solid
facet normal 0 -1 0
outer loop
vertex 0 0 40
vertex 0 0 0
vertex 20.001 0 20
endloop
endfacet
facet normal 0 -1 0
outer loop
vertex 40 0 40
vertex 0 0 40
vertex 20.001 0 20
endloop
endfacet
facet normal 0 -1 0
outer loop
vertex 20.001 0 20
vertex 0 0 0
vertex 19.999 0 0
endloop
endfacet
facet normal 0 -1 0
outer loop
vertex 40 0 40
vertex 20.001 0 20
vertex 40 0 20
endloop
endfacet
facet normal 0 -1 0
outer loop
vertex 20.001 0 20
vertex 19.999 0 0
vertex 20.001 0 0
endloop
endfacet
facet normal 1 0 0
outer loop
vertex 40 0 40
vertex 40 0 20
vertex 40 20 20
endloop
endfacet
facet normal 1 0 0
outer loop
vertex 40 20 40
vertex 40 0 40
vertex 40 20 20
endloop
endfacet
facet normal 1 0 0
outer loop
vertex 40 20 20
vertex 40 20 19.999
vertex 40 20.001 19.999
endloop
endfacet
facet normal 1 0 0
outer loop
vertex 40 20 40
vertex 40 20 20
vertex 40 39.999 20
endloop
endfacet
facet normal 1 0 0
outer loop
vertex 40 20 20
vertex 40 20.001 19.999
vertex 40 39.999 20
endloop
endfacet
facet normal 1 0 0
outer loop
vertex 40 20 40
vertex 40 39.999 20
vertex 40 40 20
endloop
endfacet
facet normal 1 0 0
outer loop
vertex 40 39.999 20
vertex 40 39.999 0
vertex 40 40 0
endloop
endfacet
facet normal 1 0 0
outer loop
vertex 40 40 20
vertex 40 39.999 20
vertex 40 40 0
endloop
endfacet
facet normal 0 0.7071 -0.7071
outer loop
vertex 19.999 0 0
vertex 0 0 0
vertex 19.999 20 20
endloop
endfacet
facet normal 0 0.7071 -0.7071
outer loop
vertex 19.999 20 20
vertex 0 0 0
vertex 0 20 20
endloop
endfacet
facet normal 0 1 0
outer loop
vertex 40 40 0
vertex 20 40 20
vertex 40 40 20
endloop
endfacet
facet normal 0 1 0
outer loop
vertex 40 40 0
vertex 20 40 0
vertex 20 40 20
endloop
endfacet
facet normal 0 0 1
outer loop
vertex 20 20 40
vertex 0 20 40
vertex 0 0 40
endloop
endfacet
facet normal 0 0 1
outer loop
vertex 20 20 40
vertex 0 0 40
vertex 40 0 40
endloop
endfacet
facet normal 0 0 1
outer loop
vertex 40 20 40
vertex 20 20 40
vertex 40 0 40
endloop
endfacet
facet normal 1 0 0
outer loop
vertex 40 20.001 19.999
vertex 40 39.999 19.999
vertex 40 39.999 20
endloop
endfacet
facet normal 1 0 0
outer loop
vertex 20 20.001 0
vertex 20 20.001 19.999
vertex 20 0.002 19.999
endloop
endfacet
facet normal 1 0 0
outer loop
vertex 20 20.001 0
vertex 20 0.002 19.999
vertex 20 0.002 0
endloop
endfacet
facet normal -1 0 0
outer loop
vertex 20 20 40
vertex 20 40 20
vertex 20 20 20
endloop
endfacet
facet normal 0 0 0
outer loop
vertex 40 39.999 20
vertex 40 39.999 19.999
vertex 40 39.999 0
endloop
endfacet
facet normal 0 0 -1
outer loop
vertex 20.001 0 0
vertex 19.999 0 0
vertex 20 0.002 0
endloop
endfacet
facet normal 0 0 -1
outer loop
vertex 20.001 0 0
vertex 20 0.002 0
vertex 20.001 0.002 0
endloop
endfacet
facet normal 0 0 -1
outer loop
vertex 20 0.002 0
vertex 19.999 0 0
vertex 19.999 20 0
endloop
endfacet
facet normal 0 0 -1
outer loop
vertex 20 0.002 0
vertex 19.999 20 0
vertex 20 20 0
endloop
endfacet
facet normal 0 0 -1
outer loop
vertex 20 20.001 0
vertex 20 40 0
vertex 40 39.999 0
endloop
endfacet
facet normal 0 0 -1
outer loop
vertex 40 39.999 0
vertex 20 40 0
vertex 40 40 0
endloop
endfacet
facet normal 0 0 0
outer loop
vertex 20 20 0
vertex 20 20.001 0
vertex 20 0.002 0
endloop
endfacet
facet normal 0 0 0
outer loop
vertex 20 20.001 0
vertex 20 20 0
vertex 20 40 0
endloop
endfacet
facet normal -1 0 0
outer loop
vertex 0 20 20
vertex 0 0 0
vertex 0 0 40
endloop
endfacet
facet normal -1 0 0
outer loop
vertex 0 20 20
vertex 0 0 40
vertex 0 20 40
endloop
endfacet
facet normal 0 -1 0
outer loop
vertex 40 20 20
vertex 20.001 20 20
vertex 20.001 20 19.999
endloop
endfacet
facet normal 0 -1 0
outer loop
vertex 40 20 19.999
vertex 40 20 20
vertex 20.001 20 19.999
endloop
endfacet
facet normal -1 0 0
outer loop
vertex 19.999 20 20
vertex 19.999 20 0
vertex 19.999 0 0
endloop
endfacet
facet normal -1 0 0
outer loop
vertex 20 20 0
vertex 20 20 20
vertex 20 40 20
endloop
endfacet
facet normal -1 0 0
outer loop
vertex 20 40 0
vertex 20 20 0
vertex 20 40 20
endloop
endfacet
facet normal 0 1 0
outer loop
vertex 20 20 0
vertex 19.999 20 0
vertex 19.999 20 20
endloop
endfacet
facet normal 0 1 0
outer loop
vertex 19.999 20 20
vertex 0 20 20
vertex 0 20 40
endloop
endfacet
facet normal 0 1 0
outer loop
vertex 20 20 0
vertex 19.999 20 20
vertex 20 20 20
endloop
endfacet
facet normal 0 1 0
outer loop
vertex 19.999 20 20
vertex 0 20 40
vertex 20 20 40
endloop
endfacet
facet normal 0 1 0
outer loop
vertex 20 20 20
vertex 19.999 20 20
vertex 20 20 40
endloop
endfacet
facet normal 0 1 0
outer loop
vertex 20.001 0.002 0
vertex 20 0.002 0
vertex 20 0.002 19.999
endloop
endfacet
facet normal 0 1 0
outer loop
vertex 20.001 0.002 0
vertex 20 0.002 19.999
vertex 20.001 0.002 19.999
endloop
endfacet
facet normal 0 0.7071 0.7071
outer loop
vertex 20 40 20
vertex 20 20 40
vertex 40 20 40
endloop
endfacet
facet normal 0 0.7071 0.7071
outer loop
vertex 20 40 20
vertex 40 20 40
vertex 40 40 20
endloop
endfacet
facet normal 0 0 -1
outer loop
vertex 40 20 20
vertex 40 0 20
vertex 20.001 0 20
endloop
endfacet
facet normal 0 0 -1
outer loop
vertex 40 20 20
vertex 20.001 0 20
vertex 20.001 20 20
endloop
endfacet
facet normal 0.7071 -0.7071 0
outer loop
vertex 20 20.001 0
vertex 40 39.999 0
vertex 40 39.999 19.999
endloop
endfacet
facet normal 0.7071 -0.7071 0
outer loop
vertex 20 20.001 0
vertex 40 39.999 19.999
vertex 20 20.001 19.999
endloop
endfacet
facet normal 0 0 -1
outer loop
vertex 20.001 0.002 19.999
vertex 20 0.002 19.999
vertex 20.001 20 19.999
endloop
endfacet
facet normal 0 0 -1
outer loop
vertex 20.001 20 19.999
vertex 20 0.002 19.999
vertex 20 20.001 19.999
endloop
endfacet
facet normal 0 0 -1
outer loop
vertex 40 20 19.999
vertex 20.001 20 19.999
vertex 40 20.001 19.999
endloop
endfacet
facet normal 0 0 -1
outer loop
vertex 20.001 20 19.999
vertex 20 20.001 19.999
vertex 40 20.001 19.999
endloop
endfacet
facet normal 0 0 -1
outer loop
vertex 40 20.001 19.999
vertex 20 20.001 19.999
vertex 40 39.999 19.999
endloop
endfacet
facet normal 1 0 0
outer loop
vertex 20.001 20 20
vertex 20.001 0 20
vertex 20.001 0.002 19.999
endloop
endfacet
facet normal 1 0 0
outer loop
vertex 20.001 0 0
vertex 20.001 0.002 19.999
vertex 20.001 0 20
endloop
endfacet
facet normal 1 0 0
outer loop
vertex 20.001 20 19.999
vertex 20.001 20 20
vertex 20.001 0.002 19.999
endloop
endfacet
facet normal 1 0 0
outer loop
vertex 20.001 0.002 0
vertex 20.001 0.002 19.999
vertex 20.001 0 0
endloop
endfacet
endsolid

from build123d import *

# Parameters (mm, degrees)
SKETCH1_W           = 40
SKETCH1_H           = 40
BOSS_EXTRUDE1_DEPTH = 40
SKETCH2_W           = 20
SKETCH2_H           = 20
CUT_EXTRUDE1_DEPTH  = 40
CUT_EXTRUDE2_DEPTH  = 40
SKETCH4_W           = 20
SKETCH4_H           = 20
CUT_EXTRUDE4_DEPTH  = 19.999
CUT_EXTRUDE6_DEPTH  = 19.999
CUT_EXTRUDE7_DEPTH  = 19.999
SKETCH7_W           = 19.9999
SKETCH7_H           = 19.999
CUT_EXTRUDE8_DEPTH  = 19.999
CUT_EXTRUDE9_DEPTH  = 19.999
CUT_EXTRUDE10_DEPTH = 0.0001


with BuildPart() as part:
    # Sketch1 → Boss-Extrude1 (new body)
    with BuildSketch(Plane.XY):
        with Locations((20, 20)):
            Rectangle(SKETCH1_W, SKETCH1_H)
    extrude(amount=BOSS_EXTRUDE1_DEPTH)

    # Sketch2 → Cut-Extrude1 (cut)
    with BuildSketch(Plane.XY.offset(40)):
        with Locations((10, 30)):
            Rectangle(SKETCH2_W, SKETCH2_H)
    extrude(amount=-CUT_EXTRUDE1_DEPTH, mode=Mode.SUBTRACT)

    # Sketch3 → Cut-Extrude2 (cut)
    with BuildSketch(Plane.ZY.offset(-20)):
        Polygon((40, 20), (20, 40), (40, 40), align=None)
    extrude(amount=-CUT_EXTRUDE2_DEPTH, mode=Mode.SUBTRACT)

    # Sketch4 → Cut-Extrude4 (cut)
    with BuildSketch(Plane(origin=(40, 0, 0), x_dir=(0, 0, -1), z_dir=(1, 0, 0))):
        with Locations((-10, 10)):
            Rectangle(SKETCH4_W, SKETCH4_H)
    extrude(amount=-CUT_EXTRUDE4_DEPTH, mode=Mode.SUBTRACT)

    # Sketch5 → Cut-Extrude6 (cut)
    with BuildSketch(Plane(origin=(0, 0, 0), x_dir=(-1, 0, 0), z_dir=(0, 0, -1))):
        Polygon((-39.9999, 39.999), (-20.0001, 20.001), (-39.9999, 20.001), align=None)
    extrude(amount=-CUT_EXTRUDE6_DEPTH, mode=Mode.SUBTRACT)

    # Sketch6 → Cut-Extrude7 (cut)
    with BuildSketch(Plane.ZY.offset(-39.9999)):
        Polygon((0, 20.001), (19.999, 20.001), (20, 39.999), (0, 39.999), align=None)
    extrude(amount=-CUT_EXTRUDE7_DEPTH, mode=Mode.SUBTRACT)

    # Sketch7 → Cut-Extrude8 (cut)
    with BuildSketch(Plane(origin=(0, 20.001, 0), x_dir=(1, 0, 0), z_dir=(0, 1, 0))):
        with Locations((30.00005, -9.9995)):
            Rectangle(SKETCH7_W, SKETCH7_H)
    extrude(amount=-CUT_EXTRUDE8_DEPTH, mode=Mode.SUBTRACT)

    # Sketch8 → Cut-Extrude9 (cut)
    with BuildSketch(Plane.ZY):
        Polygon((0, 0), (20, 20), (0, 20), align=None)
    extrude(amount=-CUT_EXTRUDE9_DEPTH, mode=Mode.SUBTRACT)

    # Sketch9 → Cut-Extrude10 (cut)
    with BuildSketch(Plane.ZY.offset(-20)):
        Polygon((20, 40), (20, 20), (40, 20), align=None)
    extrude(amount=-CUT_EXTRUDE10_DEPTH, mode=Mode.SUBTRACT)


solid = part.part
